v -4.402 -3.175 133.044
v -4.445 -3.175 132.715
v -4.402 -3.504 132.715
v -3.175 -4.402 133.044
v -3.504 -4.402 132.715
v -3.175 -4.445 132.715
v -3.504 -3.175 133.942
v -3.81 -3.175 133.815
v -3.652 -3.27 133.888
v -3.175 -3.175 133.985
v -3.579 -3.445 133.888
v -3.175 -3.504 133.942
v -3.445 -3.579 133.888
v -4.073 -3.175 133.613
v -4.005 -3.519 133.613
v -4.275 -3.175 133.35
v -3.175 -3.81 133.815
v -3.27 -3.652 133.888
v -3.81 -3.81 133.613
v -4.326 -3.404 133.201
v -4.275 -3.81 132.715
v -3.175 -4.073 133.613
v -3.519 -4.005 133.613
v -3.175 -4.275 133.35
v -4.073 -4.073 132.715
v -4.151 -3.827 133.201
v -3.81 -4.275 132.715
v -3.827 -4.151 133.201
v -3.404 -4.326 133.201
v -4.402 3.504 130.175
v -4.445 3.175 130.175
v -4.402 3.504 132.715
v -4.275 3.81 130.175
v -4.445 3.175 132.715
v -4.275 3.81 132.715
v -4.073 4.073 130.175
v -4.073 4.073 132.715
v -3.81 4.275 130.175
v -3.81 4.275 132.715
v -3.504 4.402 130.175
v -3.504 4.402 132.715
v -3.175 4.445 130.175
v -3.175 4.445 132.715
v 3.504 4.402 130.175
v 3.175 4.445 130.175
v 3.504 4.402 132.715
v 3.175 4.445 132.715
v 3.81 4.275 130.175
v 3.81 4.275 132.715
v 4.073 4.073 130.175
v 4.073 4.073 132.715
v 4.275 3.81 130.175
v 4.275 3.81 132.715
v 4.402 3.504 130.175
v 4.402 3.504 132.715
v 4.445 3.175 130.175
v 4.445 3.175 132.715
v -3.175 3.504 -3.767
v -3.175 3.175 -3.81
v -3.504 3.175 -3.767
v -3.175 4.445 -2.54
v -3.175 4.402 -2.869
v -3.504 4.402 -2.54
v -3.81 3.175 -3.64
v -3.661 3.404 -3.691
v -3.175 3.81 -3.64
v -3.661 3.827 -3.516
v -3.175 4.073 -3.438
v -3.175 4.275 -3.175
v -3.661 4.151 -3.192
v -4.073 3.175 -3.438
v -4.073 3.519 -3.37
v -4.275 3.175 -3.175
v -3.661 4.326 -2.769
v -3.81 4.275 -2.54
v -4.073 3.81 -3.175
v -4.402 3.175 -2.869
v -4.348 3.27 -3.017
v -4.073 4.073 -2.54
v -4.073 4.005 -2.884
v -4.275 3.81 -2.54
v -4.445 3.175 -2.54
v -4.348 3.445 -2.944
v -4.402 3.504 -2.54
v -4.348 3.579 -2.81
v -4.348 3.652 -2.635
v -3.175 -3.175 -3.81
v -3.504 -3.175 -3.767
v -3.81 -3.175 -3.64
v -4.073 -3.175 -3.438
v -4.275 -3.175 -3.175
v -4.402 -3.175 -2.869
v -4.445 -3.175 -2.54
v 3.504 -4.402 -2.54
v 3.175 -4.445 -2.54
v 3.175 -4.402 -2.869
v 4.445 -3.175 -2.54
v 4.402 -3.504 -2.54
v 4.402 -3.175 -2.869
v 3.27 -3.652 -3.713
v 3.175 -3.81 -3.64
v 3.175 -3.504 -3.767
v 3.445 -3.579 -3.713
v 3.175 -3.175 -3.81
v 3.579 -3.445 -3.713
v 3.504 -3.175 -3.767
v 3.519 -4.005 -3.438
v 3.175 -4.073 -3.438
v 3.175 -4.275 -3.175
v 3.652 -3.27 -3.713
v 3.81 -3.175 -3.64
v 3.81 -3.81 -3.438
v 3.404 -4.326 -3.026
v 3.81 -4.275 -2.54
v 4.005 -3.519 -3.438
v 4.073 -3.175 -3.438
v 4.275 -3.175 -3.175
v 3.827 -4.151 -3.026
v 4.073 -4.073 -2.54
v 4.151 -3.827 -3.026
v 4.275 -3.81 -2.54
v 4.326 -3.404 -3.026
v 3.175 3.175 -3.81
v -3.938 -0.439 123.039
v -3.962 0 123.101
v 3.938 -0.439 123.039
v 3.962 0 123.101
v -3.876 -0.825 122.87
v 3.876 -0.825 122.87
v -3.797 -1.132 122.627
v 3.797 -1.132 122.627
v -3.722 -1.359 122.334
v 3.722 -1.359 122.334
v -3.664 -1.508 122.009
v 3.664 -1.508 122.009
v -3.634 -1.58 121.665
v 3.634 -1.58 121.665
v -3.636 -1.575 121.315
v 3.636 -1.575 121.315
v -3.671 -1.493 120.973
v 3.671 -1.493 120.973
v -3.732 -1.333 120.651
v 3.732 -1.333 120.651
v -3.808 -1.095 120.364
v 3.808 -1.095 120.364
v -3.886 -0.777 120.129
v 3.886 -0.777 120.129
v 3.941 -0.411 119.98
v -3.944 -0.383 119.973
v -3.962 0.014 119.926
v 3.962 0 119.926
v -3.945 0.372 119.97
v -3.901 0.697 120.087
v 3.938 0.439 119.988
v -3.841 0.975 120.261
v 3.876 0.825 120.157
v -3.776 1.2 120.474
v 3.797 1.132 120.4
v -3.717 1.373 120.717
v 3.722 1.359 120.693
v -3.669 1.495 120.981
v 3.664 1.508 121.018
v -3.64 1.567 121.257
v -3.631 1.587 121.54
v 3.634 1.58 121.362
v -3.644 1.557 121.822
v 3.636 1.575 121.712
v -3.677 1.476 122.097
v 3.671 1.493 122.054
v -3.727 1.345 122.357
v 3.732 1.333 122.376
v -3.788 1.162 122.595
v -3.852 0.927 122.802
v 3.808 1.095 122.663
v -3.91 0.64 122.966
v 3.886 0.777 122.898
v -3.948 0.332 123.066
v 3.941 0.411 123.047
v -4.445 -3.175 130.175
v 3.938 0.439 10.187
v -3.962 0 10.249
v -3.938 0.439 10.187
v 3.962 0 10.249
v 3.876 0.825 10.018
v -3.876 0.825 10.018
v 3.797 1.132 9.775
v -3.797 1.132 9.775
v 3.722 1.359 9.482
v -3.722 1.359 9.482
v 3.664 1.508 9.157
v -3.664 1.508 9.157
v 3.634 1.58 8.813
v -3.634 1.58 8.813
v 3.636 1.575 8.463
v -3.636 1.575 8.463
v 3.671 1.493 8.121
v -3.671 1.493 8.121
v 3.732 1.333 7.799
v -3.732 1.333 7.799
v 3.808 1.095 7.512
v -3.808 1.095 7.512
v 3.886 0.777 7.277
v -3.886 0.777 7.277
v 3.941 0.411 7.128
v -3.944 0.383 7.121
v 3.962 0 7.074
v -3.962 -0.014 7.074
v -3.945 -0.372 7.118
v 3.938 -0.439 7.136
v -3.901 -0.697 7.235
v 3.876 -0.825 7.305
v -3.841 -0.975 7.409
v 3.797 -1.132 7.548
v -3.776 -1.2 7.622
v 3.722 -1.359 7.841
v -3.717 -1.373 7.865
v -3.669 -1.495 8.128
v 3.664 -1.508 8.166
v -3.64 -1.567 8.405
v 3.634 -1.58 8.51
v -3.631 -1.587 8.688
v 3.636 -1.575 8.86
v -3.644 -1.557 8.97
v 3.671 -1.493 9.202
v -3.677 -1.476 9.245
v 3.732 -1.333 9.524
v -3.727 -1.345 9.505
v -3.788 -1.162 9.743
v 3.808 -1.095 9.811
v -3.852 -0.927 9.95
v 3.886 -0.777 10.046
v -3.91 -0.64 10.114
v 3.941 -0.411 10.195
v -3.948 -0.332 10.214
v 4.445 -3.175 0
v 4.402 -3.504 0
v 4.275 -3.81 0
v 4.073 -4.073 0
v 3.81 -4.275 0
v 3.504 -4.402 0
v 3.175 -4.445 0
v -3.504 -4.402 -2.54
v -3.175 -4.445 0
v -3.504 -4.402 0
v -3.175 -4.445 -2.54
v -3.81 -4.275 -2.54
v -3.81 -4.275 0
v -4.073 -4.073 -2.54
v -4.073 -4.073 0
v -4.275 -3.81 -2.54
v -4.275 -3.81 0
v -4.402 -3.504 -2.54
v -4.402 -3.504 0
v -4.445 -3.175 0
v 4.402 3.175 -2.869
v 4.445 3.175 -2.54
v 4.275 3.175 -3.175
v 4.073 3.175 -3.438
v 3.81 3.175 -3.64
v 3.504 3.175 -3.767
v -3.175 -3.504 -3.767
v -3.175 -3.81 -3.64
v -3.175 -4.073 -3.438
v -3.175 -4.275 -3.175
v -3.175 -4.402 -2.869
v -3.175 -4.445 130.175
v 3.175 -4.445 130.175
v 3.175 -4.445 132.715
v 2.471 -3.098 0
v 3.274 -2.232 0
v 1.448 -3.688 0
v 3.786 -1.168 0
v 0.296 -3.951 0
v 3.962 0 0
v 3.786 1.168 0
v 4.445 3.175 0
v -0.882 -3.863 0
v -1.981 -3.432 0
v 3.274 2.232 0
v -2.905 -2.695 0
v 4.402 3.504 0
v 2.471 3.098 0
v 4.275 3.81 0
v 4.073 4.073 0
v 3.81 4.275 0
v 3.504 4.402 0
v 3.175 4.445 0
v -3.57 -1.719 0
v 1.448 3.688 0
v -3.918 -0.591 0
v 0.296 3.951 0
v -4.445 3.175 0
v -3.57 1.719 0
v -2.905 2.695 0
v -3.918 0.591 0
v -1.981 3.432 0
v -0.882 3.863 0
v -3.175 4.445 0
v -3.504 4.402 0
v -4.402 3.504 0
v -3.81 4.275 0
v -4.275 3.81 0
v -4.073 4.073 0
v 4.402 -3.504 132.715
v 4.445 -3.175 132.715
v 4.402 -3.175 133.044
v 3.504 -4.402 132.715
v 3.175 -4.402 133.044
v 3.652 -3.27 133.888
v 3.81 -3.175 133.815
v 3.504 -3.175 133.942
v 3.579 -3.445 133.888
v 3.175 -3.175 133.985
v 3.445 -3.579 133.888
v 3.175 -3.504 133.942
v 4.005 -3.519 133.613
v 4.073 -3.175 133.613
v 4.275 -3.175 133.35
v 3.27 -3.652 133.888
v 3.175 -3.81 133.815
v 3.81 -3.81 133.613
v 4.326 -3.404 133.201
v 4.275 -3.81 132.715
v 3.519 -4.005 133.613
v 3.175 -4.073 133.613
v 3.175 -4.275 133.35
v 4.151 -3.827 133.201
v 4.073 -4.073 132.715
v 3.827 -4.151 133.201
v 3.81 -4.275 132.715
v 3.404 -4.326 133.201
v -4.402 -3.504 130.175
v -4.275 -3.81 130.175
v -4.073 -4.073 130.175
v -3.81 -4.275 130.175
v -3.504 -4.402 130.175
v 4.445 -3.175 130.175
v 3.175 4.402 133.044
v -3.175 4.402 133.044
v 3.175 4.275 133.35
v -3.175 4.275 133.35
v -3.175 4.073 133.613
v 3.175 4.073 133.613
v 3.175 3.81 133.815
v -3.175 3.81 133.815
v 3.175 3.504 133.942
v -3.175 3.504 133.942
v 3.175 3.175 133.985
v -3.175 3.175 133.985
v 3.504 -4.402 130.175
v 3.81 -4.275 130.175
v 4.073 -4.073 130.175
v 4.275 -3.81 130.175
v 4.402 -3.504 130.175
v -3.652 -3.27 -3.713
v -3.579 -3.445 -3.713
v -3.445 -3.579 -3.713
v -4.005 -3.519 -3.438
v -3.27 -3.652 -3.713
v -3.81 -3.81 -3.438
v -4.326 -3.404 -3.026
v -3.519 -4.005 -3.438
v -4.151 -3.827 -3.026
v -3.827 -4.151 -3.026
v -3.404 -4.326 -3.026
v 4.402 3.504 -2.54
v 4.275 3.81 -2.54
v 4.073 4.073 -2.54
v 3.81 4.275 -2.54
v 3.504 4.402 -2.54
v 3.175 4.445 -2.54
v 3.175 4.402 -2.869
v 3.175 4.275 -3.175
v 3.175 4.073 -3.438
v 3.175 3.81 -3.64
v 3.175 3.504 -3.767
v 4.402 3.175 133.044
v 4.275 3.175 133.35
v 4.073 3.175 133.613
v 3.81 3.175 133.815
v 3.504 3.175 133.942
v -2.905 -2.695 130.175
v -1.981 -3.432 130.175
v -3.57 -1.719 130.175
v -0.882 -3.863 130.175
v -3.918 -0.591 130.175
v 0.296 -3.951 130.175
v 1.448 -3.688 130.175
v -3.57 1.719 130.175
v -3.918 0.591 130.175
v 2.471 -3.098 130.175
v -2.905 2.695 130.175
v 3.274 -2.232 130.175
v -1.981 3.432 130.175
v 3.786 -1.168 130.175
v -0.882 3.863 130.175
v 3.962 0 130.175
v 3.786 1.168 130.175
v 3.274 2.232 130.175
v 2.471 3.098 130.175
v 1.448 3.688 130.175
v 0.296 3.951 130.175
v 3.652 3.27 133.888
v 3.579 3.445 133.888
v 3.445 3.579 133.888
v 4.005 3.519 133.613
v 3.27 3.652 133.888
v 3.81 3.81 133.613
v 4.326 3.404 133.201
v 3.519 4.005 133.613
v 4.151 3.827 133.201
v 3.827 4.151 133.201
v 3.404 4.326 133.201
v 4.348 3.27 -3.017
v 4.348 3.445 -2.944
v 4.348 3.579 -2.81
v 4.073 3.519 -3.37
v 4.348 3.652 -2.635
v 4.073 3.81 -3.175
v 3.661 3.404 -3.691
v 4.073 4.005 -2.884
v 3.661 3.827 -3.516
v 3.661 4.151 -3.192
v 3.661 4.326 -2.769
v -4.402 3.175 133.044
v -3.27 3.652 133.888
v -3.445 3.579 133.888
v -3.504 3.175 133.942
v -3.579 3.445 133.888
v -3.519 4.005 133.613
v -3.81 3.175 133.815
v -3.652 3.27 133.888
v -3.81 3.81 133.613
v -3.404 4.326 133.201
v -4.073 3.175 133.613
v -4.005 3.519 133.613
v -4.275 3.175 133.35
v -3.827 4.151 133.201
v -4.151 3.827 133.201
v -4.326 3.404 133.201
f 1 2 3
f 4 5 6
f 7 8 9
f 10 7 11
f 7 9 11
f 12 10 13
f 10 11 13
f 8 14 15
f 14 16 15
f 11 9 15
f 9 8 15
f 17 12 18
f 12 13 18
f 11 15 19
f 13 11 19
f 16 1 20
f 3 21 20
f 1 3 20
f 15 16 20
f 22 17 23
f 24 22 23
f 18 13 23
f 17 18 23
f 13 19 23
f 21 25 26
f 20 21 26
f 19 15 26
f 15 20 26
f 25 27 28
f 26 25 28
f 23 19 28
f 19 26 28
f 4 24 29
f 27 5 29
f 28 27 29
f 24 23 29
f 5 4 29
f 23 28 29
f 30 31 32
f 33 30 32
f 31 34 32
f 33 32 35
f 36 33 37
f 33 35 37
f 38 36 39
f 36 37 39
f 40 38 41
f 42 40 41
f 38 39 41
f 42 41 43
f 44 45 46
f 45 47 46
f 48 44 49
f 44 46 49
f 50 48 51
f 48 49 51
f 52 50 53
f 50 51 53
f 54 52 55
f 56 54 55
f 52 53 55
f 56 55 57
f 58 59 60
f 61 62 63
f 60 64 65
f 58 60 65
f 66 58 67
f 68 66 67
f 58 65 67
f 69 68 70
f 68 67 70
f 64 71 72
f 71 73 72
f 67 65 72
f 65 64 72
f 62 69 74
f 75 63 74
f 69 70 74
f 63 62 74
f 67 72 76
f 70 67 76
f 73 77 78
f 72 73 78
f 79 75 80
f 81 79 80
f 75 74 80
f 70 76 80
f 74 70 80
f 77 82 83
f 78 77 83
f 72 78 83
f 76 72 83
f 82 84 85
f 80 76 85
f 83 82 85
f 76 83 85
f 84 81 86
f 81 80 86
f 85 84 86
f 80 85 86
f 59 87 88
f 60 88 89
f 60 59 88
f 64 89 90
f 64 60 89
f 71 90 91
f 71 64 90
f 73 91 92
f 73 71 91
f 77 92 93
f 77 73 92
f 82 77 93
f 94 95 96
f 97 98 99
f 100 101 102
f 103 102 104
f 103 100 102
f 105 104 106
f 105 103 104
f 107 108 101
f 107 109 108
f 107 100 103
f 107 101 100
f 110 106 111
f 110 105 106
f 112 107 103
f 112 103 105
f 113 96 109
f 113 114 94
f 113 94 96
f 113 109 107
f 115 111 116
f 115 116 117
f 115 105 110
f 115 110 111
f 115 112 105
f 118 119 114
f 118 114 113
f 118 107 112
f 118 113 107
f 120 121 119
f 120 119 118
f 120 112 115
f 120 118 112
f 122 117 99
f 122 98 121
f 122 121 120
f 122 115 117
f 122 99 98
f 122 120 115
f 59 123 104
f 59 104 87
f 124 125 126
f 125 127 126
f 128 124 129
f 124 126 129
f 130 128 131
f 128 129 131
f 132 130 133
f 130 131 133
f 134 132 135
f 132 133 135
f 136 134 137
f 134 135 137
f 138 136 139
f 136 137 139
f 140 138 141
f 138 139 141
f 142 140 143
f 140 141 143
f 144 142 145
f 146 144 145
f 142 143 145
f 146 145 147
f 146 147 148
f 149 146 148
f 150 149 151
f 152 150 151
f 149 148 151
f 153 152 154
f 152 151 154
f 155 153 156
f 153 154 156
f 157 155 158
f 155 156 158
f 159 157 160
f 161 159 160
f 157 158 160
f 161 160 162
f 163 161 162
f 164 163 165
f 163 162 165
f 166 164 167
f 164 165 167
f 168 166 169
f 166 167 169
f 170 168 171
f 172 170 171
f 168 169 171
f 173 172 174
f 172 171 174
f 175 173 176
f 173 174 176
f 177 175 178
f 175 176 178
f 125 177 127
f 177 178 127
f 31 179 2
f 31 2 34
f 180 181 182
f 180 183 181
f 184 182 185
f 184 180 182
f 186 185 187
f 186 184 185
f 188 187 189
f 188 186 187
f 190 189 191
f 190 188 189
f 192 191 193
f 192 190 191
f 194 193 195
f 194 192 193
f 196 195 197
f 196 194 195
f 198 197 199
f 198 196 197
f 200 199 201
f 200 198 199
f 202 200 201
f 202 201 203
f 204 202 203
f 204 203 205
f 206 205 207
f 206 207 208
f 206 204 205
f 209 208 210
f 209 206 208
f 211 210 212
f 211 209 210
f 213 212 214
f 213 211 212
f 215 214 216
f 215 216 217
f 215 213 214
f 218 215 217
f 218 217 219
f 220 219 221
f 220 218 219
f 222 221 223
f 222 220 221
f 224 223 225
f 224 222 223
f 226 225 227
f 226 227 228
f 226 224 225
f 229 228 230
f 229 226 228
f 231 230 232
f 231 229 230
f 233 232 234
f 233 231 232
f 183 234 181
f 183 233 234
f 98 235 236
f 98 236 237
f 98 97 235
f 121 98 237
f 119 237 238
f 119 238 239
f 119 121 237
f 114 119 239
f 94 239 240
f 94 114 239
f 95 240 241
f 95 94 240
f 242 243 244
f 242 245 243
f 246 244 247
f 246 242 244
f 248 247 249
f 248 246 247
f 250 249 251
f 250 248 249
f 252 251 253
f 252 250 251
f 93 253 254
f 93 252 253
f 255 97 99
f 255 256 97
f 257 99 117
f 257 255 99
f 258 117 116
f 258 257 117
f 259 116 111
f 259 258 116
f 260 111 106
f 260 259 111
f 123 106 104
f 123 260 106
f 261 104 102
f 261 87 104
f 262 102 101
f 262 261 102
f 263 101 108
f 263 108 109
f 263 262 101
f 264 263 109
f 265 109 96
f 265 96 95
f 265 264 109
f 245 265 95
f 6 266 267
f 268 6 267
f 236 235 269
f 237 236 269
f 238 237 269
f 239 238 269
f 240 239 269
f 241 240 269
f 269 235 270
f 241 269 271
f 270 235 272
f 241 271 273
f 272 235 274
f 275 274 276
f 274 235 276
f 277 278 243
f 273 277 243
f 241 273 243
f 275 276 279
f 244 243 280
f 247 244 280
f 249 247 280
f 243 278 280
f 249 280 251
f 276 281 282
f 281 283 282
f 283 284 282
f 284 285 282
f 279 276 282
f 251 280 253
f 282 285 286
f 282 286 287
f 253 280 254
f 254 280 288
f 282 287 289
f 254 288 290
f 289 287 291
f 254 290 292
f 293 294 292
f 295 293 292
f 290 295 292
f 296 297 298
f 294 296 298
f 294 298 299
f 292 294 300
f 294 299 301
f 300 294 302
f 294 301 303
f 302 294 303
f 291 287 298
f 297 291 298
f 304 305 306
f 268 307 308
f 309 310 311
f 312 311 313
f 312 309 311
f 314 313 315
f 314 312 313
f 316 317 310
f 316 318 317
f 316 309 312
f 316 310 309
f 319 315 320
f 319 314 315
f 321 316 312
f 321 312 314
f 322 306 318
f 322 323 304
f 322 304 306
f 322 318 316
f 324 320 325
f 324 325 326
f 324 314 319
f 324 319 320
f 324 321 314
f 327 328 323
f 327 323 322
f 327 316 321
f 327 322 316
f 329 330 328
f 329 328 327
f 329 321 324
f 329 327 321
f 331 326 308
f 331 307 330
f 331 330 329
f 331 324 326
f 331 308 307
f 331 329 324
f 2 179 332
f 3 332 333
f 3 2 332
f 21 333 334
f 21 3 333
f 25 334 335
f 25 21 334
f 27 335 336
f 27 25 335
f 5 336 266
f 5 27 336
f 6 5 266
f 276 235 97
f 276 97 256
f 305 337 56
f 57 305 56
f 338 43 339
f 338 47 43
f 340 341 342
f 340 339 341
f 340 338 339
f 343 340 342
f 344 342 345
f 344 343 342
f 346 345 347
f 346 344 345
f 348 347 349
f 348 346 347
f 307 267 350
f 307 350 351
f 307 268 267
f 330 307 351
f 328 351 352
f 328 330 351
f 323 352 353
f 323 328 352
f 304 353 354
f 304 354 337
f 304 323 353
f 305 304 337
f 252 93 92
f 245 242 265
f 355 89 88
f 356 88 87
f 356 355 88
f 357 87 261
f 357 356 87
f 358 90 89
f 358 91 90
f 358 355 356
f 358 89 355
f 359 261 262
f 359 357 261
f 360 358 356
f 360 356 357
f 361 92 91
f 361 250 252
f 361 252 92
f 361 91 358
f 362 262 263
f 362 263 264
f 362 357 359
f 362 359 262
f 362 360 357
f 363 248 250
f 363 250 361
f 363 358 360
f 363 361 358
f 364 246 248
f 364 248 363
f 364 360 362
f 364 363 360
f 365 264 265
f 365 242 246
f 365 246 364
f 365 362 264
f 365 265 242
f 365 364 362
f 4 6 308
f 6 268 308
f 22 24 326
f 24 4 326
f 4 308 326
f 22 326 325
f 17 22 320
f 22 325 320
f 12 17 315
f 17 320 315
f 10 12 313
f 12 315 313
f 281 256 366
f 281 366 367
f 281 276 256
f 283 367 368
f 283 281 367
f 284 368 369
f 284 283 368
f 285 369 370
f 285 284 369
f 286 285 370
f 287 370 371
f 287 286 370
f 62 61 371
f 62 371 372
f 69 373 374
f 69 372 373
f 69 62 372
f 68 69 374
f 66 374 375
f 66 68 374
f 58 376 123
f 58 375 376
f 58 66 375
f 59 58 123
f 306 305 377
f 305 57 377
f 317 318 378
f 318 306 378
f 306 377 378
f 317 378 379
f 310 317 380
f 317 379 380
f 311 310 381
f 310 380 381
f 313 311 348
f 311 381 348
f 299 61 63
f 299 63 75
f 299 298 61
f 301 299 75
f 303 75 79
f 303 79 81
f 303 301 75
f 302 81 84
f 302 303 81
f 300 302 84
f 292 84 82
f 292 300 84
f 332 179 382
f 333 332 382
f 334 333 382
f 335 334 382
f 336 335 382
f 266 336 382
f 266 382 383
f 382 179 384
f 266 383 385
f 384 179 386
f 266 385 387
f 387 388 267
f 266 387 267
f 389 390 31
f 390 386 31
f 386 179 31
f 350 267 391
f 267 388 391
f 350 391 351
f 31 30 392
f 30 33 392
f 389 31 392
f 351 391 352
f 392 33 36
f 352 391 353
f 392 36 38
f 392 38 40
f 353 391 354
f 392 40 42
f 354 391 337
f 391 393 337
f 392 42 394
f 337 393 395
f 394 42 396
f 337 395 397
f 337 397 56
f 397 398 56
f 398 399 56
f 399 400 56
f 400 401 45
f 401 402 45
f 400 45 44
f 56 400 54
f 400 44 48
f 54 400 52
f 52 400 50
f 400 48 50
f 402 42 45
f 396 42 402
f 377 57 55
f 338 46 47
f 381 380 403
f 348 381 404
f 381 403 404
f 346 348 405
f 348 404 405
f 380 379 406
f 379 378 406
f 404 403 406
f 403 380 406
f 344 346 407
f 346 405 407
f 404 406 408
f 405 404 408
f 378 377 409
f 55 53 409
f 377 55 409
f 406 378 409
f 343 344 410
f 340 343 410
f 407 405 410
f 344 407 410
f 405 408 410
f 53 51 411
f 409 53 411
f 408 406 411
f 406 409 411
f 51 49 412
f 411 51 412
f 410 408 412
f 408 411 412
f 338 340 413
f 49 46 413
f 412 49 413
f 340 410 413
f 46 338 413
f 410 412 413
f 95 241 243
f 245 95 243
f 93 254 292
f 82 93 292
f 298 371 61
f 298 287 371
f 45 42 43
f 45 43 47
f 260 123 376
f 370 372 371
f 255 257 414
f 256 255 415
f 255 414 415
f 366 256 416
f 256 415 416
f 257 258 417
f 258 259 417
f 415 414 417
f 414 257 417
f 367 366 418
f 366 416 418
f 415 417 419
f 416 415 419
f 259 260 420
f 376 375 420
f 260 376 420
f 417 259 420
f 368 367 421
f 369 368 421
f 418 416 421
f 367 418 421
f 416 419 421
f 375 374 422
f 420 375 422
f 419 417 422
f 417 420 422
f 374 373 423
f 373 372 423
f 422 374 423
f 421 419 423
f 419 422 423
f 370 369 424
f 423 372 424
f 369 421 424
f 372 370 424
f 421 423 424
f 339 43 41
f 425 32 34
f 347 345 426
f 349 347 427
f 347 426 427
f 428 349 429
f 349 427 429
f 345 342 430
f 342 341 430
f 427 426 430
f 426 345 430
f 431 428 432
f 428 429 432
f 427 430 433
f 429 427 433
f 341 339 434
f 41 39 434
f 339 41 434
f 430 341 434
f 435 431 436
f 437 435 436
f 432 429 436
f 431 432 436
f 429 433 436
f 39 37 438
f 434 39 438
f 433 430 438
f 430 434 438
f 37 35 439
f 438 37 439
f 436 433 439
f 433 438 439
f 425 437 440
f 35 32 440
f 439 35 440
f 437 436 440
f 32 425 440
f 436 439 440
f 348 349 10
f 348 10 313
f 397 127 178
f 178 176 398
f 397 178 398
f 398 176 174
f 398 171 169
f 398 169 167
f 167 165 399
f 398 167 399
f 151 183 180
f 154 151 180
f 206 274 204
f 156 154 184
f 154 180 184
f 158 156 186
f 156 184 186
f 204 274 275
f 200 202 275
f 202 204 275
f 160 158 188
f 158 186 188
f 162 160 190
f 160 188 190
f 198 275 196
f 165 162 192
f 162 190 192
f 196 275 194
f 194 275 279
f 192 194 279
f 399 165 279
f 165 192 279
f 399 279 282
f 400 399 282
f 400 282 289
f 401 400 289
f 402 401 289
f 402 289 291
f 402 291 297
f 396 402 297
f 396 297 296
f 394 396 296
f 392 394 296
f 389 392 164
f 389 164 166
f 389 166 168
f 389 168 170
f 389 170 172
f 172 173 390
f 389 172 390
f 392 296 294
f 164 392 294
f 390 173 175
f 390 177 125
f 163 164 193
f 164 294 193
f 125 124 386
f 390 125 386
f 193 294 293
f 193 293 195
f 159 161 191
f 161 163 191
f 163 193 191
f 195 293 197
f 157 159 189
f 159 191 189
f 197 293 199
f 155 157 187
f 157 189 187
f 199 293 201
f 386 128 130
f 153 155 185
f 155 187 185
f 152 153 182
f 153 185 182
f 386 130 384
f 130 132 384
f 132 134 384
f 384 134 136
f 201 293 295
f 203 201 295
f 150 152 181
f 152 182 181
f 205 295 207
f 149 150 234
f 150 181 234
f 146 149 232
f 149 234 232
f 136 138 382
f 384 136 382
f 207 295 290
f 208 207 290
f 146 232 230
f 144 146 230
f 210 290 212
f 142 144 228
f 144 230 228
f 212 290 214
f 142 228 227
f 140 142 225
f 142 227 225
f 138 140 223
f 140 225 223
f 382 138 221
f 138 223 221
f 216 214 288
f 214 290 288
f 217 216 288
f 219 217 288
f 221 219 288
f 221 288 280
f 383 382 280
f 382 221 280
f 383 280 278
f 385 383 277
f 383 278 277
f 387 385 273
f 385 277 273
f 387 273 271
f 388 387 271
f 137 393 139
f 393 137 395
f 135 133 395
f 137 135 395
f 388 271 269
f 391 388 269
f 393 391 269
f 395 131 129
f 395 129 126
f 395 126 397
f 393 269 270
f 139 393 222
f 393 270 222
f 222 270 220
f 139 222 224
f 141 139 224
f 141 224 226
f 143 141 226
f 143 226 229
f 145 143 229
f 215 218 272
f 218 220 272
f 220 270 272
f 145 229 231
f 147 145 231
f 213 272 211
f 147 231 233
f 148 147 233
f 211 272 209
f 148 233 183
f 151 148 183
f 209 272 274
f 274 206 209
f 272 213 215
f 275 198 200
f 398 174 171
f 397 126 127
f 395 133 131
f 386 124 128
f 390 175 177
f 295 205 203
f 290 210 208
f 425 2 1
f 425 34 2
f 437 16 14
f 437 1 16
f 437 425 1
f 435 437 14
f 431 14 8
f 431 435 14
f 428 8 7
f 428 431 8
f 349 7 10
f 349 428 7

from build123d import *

# Parameters (mm, degrees)
SKETCH2_R           = 3.9624
BOSS_EXTRUDE1_DEPTH = 130.175
SKETCH3_W           = 16.328349939
SKETCH3_H           = 1.5875
SKETCH6_W           = 7.9248
SKETCH6_H           = 1.5875
SKETCH7_W           = 8.89
SKETCH7_H           = 8.89
BOSS_EXTRUDE2_DEPTH = 3.81
SKETCH8_W           = 8.89
SKETCH8_H           = 8.89
BOSS_EXTRUDE3_DEPTH = 3.81
FILLET1_R           = 1.27
FILLET2_R           = 1.27
FILLET3_R           = 1.27


with BuildPart() as part:
    # Sketch2 → Boss-Extrude1 (new body)
    with BuildSketch(Plane.XY):
        Circle(SKETCH2_R)
    extrude(amount=BOSS_EXTRUDE1_DEPTH)

    # Sketch3 → Cut-Revolve2 (revolve, cut)
    with BuildSketch(Plane(origin=(0, 0, 0), x_dir=(1, 0, 0), z_dir=(0, 1, 0)), mode=Mode.PRIVATE) as cut_revolve2_sk:
        with Locations((-0.379751444, -7.86765)):
            Rectangle(SKETCH3_W, SKETCH3_H)
    revolve(cut_revolve2_sk.sketch.rotate(Axis((7.784423526, 0, 8.6614), (-1, 0, 0)), 179.999999998), axis=Axis((7.784423526, 0, 8.6614), (-1, 0, 0)), mode=Mode.SUBTRACT)

    # Sketch6 → Cut-Revolve4 (revolve, cut)
    with BuildSketch(Plane(origin=(0, 0, 0), x_dir=(1, 0, 0), z_dir=(0, 1, 0))):
        with Locations((0, -122.30735)):
            Rectangle(SKETCH6_W, SKETCH6_H)
    revolve(axis=Axis((-3.9624, 0, 121.5136), (1, 0, 0)), mode=Mode.SUBTRACT)

    # Sketch7 → Boss-Extrude2 (add)
    with BuildSketch(Plane.XY.offset(130.175)):
        Rectangle(SKETCH7_W, SKETCH7_H)
    extrude(amount=BOSS_EXTRUDE2_DEPTH)

    # Sketch8 → Boss-Extrude3 (add)
    with BuildSketch(Plane(origin=(0, 0, 0), x_dir=(-1, 0, 0), z_dir=(0, 0, -1))):
        Rectangle(SKETCH8_W, SKETCH8_H)
    extrude(amount=BOSS_EXTRUDE3_DEPTH)

    # Fillet1
    fillet1_edges = [part.edges().sort_by_distance(p)[0] for p in [
        (0, 4.445, -3.81),
    ]]
    fillet(fillet1_edges, radius=FILLET1_R)

    # Fillet2
    fillet2_edges = [part.edges().sort_by_distance(p)[0] for p in [
        (-4.445, -4.445, -1.905),
        (4.445, -4.445, -1.905),
        (-4.445, -0.635, -3.81),
        (0, -4.445, -3.81),
        (4.445, -0.635, -3.81),
        (4.445, 4.445, -1.27),
        (4.445, 4.073025612, -3.438025612),
        (-4.445, 4.445, -1.27),
        (-4.445, 4.073025612, -3.438025612),
    ]]
    fillet(fillet2_edges, radius=FILLET2_R)

    # Fillet3
    fillet3_edges = [part.edges().sort_by_distance(p)[0] for p in [
        (4.445, -4.445, 132.08),
        (4.445, 4.445, 132.08),
        (-4.445, 4.445, 132.08),
        (-4.445, -4.445, 132.08),
        (4.445, 0, 133.985),
        (0, 4.445, 133.985),
        (-4.445, 0, 133.985),
        (0, -4.445, 133.985),
    ]]
    fillet(fillet3_edges, radius=FILLET3_R)


solid = part.part
